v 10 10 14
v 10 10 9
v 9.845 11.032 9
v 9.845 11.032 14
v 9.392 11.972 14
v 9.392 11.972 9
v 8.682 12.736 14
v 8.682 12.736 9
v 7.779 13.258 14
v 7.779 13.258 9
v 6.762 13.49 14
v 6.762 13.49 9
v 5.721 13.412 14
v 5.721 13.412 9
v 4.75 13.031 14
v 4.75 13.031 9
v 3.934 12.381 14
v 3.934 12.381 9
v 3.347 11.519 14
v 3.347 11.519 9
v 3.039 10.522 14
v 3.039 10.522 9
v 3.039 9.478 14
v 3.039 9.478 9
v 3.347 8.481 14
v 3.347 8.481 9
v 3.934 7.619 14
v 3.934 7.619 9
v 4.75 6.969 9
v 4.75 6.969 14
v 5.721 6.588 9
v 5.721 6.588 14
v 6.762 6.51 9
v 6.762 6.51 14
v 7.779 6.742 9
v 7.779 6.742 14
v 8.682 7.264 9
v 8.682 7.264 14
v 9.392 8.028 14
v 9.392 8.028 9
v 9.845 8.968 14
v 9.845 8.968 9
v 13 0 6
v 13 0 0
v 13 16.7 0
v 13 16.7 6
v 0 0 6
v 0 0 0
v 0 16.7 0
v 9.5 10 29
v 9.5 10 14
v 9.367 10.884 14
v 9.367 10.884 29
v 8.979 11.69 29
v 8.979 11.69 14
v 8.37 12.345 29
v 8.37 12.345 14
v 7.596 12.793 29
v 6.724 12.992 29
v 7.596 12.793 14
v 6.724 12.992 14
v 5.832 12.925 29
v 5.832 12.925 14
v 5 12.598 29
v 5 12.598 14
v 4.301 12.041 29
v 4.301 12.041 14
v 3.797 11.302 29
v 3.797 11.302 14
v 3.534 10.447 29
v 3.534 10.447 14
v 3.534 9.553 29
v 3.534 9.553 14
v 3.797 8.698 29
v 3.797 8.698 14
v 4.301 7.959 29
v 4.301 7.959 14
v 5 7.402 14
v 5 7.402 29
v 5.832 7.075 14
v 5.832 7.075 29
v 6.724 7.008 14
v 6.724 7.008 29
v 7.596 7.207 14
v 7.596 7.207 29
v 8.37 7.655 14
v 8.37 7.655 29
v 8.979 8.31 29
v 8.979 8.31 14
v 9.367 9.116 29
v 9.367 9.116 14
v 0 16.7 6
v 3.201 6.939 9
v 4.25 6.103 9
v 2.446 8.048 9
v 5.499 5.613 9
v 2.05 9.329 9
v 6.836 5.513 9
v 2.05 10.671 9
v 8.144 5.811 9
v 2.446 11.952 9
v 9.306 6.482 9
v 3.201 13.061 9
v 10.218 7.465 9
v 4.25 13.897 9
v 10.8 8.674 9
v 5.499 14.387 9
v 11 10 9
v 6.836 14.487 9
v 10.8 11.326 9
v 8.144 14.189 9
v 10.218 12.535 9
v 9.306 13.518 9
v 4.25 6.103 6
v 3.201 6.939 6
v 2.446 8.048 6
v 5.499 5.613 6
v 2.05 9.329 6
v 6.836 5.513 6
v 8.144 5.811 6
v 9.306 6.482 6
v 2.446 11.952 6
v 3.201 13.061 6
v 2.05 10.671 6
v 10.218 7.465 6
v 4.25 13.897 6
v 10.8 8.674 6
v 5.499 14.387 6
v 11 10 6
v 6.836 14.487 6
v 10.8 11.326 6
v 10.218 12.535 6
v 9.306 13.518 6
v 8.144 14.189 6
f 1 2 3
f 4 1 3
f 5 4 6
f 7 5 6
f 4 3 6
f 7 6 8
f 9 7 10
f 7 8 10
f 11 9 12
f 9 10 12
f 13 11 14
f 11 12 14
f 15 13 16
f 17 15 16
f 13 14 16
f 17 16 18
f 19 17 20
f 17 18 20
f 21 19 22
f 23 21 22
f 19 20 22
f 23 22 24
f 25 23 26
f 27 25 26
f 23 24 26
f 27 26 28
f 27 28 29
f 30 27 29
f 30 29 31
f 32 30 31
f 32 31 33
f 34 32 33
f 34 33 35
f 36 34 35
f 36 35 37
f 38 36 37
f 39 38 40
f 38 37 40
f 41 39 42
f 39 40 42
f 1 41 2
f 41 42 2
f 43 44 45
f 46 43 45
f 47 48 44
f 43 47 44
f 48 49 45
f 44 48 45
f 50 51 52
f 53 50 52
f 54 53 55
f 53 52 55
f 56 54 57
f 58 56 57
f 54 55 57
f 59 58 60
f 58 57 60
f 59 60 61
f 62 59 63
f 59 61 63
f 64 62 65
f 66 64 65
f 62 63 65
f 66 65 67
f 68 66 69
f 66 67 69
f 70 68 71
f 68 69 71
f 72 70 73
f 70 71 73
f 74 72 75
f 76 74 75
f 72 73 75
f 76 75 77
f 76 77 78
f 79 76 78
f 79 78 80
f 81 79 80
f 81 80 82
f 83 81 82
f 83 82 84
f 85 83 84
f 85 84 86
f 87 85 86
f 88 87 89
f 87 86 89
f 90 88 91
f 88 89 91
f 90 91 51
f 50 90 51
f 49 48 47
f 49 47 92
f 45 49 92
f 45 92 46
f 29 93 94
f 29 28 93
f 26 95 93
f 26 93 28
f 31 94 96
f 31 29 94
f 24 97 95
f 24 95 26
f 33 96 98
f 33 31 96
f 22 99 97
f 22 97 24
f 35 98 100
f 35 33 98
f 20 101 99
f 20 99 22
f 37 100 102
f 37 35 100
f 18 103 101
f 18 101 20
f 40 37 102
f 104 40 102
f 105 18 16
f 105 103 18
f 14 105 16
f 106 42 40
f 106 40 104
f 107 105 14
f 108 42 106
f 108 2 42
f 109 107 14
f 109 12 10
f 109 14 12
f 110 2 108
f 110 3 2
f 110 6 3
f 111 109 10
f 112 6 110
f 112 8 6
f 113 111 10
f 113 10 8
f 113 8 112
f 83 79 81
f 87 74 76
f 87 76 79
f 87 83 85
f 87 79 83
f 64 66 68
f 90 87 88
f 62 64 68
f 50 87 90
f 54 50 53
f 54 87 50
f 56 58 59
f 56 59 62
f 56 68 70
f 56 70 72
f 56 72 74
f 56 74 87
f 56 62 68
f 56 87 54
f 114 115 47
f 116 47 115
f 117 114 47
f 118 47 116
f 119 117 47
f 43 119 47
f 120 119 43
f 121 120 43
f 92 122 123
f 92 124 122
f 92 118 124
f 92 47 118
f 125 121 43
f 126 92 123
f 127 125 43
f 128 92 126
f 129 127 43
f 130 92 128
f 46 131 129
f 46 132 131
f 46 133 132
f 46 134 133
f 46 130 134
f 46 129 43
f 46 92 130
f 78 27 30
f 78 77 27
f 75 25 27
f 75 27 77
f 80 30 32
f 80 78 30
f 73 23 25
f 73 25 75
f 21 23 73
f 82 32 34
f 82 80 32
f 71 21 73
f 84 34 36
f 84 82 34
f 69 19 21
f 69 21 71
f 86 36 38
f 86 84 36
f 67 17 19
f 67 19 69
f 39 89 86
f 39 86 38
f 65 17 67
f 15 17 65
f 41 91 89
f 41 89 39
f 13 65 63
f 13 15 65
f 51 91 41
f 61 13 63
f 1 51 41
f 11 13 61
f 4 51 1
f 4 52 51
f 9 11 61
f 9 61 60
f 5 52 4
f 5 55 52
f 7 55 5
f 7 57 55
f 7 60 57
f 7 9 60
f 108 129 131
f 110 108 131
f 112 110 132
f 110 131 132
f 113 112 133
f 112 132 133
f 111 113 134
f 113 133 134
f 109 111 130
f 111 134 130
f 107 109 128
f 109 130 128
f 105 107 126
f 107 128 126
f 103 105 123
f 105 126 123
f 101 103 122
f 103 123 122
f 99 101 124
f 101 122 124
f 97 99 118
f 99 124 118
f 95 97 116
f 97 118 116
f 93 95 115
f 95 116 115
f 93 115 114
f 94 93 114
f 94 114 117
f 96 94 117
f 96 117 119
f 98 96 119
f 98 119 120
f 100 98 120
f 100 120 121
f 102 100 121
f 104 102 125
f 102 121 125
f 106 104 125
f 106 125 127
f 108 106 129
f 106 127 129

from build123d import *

# Parameters (mm, degrees)
SKETCH022_W  = 13
SKETCH022_H  = 16.7
PAD020_DEPTH = 6
SKETCH023_R  = 4.5
PAD021_DEPTH = 3
SKETCH024_R  = 3.5
PAD022_DEPTH = 5
SKETCH025_R  = 3
PAD023_DEPTH = 15


with BuildPart() as part:
    # Sketch022 → Pad020 (new body)
    with BuildSketch(Plane.XY):
        with Locations((6.5, 8.35)):
            Rectangle(SKETCH022_W, SKETCH022_H)
    extrude(amount=PAD020_DEPTH)

    # Sketch023 (on Face6 of Pad020) → Pad021 (join)
    with BuildSketch(Plane.XY.offset(6)):
        with Locations((6.5, 10)):
            Circle(SKETCH023_R)
    extrude(amount=PAD021_DEPTH)

    # Sketch024 (on Face8 of Pad021) → Pad022 (join)
    with BuildSketch(Plane.XY.offset(9)):
        with Locations((6.5, 10)):
            Circle(SKETCH024_R)
    extrude(amount=PAD022_DEPTH)

    # Sketch025 (on Face10 of Pad022) → Pad023 (join)
    with BuildSketch(Plane.XY.offset(14)):
        with Locations((6.5, 10)):
            Circle(SKETCH025_R)
    extrude(amount=PAD023_DEPTH)


solid = part.part
